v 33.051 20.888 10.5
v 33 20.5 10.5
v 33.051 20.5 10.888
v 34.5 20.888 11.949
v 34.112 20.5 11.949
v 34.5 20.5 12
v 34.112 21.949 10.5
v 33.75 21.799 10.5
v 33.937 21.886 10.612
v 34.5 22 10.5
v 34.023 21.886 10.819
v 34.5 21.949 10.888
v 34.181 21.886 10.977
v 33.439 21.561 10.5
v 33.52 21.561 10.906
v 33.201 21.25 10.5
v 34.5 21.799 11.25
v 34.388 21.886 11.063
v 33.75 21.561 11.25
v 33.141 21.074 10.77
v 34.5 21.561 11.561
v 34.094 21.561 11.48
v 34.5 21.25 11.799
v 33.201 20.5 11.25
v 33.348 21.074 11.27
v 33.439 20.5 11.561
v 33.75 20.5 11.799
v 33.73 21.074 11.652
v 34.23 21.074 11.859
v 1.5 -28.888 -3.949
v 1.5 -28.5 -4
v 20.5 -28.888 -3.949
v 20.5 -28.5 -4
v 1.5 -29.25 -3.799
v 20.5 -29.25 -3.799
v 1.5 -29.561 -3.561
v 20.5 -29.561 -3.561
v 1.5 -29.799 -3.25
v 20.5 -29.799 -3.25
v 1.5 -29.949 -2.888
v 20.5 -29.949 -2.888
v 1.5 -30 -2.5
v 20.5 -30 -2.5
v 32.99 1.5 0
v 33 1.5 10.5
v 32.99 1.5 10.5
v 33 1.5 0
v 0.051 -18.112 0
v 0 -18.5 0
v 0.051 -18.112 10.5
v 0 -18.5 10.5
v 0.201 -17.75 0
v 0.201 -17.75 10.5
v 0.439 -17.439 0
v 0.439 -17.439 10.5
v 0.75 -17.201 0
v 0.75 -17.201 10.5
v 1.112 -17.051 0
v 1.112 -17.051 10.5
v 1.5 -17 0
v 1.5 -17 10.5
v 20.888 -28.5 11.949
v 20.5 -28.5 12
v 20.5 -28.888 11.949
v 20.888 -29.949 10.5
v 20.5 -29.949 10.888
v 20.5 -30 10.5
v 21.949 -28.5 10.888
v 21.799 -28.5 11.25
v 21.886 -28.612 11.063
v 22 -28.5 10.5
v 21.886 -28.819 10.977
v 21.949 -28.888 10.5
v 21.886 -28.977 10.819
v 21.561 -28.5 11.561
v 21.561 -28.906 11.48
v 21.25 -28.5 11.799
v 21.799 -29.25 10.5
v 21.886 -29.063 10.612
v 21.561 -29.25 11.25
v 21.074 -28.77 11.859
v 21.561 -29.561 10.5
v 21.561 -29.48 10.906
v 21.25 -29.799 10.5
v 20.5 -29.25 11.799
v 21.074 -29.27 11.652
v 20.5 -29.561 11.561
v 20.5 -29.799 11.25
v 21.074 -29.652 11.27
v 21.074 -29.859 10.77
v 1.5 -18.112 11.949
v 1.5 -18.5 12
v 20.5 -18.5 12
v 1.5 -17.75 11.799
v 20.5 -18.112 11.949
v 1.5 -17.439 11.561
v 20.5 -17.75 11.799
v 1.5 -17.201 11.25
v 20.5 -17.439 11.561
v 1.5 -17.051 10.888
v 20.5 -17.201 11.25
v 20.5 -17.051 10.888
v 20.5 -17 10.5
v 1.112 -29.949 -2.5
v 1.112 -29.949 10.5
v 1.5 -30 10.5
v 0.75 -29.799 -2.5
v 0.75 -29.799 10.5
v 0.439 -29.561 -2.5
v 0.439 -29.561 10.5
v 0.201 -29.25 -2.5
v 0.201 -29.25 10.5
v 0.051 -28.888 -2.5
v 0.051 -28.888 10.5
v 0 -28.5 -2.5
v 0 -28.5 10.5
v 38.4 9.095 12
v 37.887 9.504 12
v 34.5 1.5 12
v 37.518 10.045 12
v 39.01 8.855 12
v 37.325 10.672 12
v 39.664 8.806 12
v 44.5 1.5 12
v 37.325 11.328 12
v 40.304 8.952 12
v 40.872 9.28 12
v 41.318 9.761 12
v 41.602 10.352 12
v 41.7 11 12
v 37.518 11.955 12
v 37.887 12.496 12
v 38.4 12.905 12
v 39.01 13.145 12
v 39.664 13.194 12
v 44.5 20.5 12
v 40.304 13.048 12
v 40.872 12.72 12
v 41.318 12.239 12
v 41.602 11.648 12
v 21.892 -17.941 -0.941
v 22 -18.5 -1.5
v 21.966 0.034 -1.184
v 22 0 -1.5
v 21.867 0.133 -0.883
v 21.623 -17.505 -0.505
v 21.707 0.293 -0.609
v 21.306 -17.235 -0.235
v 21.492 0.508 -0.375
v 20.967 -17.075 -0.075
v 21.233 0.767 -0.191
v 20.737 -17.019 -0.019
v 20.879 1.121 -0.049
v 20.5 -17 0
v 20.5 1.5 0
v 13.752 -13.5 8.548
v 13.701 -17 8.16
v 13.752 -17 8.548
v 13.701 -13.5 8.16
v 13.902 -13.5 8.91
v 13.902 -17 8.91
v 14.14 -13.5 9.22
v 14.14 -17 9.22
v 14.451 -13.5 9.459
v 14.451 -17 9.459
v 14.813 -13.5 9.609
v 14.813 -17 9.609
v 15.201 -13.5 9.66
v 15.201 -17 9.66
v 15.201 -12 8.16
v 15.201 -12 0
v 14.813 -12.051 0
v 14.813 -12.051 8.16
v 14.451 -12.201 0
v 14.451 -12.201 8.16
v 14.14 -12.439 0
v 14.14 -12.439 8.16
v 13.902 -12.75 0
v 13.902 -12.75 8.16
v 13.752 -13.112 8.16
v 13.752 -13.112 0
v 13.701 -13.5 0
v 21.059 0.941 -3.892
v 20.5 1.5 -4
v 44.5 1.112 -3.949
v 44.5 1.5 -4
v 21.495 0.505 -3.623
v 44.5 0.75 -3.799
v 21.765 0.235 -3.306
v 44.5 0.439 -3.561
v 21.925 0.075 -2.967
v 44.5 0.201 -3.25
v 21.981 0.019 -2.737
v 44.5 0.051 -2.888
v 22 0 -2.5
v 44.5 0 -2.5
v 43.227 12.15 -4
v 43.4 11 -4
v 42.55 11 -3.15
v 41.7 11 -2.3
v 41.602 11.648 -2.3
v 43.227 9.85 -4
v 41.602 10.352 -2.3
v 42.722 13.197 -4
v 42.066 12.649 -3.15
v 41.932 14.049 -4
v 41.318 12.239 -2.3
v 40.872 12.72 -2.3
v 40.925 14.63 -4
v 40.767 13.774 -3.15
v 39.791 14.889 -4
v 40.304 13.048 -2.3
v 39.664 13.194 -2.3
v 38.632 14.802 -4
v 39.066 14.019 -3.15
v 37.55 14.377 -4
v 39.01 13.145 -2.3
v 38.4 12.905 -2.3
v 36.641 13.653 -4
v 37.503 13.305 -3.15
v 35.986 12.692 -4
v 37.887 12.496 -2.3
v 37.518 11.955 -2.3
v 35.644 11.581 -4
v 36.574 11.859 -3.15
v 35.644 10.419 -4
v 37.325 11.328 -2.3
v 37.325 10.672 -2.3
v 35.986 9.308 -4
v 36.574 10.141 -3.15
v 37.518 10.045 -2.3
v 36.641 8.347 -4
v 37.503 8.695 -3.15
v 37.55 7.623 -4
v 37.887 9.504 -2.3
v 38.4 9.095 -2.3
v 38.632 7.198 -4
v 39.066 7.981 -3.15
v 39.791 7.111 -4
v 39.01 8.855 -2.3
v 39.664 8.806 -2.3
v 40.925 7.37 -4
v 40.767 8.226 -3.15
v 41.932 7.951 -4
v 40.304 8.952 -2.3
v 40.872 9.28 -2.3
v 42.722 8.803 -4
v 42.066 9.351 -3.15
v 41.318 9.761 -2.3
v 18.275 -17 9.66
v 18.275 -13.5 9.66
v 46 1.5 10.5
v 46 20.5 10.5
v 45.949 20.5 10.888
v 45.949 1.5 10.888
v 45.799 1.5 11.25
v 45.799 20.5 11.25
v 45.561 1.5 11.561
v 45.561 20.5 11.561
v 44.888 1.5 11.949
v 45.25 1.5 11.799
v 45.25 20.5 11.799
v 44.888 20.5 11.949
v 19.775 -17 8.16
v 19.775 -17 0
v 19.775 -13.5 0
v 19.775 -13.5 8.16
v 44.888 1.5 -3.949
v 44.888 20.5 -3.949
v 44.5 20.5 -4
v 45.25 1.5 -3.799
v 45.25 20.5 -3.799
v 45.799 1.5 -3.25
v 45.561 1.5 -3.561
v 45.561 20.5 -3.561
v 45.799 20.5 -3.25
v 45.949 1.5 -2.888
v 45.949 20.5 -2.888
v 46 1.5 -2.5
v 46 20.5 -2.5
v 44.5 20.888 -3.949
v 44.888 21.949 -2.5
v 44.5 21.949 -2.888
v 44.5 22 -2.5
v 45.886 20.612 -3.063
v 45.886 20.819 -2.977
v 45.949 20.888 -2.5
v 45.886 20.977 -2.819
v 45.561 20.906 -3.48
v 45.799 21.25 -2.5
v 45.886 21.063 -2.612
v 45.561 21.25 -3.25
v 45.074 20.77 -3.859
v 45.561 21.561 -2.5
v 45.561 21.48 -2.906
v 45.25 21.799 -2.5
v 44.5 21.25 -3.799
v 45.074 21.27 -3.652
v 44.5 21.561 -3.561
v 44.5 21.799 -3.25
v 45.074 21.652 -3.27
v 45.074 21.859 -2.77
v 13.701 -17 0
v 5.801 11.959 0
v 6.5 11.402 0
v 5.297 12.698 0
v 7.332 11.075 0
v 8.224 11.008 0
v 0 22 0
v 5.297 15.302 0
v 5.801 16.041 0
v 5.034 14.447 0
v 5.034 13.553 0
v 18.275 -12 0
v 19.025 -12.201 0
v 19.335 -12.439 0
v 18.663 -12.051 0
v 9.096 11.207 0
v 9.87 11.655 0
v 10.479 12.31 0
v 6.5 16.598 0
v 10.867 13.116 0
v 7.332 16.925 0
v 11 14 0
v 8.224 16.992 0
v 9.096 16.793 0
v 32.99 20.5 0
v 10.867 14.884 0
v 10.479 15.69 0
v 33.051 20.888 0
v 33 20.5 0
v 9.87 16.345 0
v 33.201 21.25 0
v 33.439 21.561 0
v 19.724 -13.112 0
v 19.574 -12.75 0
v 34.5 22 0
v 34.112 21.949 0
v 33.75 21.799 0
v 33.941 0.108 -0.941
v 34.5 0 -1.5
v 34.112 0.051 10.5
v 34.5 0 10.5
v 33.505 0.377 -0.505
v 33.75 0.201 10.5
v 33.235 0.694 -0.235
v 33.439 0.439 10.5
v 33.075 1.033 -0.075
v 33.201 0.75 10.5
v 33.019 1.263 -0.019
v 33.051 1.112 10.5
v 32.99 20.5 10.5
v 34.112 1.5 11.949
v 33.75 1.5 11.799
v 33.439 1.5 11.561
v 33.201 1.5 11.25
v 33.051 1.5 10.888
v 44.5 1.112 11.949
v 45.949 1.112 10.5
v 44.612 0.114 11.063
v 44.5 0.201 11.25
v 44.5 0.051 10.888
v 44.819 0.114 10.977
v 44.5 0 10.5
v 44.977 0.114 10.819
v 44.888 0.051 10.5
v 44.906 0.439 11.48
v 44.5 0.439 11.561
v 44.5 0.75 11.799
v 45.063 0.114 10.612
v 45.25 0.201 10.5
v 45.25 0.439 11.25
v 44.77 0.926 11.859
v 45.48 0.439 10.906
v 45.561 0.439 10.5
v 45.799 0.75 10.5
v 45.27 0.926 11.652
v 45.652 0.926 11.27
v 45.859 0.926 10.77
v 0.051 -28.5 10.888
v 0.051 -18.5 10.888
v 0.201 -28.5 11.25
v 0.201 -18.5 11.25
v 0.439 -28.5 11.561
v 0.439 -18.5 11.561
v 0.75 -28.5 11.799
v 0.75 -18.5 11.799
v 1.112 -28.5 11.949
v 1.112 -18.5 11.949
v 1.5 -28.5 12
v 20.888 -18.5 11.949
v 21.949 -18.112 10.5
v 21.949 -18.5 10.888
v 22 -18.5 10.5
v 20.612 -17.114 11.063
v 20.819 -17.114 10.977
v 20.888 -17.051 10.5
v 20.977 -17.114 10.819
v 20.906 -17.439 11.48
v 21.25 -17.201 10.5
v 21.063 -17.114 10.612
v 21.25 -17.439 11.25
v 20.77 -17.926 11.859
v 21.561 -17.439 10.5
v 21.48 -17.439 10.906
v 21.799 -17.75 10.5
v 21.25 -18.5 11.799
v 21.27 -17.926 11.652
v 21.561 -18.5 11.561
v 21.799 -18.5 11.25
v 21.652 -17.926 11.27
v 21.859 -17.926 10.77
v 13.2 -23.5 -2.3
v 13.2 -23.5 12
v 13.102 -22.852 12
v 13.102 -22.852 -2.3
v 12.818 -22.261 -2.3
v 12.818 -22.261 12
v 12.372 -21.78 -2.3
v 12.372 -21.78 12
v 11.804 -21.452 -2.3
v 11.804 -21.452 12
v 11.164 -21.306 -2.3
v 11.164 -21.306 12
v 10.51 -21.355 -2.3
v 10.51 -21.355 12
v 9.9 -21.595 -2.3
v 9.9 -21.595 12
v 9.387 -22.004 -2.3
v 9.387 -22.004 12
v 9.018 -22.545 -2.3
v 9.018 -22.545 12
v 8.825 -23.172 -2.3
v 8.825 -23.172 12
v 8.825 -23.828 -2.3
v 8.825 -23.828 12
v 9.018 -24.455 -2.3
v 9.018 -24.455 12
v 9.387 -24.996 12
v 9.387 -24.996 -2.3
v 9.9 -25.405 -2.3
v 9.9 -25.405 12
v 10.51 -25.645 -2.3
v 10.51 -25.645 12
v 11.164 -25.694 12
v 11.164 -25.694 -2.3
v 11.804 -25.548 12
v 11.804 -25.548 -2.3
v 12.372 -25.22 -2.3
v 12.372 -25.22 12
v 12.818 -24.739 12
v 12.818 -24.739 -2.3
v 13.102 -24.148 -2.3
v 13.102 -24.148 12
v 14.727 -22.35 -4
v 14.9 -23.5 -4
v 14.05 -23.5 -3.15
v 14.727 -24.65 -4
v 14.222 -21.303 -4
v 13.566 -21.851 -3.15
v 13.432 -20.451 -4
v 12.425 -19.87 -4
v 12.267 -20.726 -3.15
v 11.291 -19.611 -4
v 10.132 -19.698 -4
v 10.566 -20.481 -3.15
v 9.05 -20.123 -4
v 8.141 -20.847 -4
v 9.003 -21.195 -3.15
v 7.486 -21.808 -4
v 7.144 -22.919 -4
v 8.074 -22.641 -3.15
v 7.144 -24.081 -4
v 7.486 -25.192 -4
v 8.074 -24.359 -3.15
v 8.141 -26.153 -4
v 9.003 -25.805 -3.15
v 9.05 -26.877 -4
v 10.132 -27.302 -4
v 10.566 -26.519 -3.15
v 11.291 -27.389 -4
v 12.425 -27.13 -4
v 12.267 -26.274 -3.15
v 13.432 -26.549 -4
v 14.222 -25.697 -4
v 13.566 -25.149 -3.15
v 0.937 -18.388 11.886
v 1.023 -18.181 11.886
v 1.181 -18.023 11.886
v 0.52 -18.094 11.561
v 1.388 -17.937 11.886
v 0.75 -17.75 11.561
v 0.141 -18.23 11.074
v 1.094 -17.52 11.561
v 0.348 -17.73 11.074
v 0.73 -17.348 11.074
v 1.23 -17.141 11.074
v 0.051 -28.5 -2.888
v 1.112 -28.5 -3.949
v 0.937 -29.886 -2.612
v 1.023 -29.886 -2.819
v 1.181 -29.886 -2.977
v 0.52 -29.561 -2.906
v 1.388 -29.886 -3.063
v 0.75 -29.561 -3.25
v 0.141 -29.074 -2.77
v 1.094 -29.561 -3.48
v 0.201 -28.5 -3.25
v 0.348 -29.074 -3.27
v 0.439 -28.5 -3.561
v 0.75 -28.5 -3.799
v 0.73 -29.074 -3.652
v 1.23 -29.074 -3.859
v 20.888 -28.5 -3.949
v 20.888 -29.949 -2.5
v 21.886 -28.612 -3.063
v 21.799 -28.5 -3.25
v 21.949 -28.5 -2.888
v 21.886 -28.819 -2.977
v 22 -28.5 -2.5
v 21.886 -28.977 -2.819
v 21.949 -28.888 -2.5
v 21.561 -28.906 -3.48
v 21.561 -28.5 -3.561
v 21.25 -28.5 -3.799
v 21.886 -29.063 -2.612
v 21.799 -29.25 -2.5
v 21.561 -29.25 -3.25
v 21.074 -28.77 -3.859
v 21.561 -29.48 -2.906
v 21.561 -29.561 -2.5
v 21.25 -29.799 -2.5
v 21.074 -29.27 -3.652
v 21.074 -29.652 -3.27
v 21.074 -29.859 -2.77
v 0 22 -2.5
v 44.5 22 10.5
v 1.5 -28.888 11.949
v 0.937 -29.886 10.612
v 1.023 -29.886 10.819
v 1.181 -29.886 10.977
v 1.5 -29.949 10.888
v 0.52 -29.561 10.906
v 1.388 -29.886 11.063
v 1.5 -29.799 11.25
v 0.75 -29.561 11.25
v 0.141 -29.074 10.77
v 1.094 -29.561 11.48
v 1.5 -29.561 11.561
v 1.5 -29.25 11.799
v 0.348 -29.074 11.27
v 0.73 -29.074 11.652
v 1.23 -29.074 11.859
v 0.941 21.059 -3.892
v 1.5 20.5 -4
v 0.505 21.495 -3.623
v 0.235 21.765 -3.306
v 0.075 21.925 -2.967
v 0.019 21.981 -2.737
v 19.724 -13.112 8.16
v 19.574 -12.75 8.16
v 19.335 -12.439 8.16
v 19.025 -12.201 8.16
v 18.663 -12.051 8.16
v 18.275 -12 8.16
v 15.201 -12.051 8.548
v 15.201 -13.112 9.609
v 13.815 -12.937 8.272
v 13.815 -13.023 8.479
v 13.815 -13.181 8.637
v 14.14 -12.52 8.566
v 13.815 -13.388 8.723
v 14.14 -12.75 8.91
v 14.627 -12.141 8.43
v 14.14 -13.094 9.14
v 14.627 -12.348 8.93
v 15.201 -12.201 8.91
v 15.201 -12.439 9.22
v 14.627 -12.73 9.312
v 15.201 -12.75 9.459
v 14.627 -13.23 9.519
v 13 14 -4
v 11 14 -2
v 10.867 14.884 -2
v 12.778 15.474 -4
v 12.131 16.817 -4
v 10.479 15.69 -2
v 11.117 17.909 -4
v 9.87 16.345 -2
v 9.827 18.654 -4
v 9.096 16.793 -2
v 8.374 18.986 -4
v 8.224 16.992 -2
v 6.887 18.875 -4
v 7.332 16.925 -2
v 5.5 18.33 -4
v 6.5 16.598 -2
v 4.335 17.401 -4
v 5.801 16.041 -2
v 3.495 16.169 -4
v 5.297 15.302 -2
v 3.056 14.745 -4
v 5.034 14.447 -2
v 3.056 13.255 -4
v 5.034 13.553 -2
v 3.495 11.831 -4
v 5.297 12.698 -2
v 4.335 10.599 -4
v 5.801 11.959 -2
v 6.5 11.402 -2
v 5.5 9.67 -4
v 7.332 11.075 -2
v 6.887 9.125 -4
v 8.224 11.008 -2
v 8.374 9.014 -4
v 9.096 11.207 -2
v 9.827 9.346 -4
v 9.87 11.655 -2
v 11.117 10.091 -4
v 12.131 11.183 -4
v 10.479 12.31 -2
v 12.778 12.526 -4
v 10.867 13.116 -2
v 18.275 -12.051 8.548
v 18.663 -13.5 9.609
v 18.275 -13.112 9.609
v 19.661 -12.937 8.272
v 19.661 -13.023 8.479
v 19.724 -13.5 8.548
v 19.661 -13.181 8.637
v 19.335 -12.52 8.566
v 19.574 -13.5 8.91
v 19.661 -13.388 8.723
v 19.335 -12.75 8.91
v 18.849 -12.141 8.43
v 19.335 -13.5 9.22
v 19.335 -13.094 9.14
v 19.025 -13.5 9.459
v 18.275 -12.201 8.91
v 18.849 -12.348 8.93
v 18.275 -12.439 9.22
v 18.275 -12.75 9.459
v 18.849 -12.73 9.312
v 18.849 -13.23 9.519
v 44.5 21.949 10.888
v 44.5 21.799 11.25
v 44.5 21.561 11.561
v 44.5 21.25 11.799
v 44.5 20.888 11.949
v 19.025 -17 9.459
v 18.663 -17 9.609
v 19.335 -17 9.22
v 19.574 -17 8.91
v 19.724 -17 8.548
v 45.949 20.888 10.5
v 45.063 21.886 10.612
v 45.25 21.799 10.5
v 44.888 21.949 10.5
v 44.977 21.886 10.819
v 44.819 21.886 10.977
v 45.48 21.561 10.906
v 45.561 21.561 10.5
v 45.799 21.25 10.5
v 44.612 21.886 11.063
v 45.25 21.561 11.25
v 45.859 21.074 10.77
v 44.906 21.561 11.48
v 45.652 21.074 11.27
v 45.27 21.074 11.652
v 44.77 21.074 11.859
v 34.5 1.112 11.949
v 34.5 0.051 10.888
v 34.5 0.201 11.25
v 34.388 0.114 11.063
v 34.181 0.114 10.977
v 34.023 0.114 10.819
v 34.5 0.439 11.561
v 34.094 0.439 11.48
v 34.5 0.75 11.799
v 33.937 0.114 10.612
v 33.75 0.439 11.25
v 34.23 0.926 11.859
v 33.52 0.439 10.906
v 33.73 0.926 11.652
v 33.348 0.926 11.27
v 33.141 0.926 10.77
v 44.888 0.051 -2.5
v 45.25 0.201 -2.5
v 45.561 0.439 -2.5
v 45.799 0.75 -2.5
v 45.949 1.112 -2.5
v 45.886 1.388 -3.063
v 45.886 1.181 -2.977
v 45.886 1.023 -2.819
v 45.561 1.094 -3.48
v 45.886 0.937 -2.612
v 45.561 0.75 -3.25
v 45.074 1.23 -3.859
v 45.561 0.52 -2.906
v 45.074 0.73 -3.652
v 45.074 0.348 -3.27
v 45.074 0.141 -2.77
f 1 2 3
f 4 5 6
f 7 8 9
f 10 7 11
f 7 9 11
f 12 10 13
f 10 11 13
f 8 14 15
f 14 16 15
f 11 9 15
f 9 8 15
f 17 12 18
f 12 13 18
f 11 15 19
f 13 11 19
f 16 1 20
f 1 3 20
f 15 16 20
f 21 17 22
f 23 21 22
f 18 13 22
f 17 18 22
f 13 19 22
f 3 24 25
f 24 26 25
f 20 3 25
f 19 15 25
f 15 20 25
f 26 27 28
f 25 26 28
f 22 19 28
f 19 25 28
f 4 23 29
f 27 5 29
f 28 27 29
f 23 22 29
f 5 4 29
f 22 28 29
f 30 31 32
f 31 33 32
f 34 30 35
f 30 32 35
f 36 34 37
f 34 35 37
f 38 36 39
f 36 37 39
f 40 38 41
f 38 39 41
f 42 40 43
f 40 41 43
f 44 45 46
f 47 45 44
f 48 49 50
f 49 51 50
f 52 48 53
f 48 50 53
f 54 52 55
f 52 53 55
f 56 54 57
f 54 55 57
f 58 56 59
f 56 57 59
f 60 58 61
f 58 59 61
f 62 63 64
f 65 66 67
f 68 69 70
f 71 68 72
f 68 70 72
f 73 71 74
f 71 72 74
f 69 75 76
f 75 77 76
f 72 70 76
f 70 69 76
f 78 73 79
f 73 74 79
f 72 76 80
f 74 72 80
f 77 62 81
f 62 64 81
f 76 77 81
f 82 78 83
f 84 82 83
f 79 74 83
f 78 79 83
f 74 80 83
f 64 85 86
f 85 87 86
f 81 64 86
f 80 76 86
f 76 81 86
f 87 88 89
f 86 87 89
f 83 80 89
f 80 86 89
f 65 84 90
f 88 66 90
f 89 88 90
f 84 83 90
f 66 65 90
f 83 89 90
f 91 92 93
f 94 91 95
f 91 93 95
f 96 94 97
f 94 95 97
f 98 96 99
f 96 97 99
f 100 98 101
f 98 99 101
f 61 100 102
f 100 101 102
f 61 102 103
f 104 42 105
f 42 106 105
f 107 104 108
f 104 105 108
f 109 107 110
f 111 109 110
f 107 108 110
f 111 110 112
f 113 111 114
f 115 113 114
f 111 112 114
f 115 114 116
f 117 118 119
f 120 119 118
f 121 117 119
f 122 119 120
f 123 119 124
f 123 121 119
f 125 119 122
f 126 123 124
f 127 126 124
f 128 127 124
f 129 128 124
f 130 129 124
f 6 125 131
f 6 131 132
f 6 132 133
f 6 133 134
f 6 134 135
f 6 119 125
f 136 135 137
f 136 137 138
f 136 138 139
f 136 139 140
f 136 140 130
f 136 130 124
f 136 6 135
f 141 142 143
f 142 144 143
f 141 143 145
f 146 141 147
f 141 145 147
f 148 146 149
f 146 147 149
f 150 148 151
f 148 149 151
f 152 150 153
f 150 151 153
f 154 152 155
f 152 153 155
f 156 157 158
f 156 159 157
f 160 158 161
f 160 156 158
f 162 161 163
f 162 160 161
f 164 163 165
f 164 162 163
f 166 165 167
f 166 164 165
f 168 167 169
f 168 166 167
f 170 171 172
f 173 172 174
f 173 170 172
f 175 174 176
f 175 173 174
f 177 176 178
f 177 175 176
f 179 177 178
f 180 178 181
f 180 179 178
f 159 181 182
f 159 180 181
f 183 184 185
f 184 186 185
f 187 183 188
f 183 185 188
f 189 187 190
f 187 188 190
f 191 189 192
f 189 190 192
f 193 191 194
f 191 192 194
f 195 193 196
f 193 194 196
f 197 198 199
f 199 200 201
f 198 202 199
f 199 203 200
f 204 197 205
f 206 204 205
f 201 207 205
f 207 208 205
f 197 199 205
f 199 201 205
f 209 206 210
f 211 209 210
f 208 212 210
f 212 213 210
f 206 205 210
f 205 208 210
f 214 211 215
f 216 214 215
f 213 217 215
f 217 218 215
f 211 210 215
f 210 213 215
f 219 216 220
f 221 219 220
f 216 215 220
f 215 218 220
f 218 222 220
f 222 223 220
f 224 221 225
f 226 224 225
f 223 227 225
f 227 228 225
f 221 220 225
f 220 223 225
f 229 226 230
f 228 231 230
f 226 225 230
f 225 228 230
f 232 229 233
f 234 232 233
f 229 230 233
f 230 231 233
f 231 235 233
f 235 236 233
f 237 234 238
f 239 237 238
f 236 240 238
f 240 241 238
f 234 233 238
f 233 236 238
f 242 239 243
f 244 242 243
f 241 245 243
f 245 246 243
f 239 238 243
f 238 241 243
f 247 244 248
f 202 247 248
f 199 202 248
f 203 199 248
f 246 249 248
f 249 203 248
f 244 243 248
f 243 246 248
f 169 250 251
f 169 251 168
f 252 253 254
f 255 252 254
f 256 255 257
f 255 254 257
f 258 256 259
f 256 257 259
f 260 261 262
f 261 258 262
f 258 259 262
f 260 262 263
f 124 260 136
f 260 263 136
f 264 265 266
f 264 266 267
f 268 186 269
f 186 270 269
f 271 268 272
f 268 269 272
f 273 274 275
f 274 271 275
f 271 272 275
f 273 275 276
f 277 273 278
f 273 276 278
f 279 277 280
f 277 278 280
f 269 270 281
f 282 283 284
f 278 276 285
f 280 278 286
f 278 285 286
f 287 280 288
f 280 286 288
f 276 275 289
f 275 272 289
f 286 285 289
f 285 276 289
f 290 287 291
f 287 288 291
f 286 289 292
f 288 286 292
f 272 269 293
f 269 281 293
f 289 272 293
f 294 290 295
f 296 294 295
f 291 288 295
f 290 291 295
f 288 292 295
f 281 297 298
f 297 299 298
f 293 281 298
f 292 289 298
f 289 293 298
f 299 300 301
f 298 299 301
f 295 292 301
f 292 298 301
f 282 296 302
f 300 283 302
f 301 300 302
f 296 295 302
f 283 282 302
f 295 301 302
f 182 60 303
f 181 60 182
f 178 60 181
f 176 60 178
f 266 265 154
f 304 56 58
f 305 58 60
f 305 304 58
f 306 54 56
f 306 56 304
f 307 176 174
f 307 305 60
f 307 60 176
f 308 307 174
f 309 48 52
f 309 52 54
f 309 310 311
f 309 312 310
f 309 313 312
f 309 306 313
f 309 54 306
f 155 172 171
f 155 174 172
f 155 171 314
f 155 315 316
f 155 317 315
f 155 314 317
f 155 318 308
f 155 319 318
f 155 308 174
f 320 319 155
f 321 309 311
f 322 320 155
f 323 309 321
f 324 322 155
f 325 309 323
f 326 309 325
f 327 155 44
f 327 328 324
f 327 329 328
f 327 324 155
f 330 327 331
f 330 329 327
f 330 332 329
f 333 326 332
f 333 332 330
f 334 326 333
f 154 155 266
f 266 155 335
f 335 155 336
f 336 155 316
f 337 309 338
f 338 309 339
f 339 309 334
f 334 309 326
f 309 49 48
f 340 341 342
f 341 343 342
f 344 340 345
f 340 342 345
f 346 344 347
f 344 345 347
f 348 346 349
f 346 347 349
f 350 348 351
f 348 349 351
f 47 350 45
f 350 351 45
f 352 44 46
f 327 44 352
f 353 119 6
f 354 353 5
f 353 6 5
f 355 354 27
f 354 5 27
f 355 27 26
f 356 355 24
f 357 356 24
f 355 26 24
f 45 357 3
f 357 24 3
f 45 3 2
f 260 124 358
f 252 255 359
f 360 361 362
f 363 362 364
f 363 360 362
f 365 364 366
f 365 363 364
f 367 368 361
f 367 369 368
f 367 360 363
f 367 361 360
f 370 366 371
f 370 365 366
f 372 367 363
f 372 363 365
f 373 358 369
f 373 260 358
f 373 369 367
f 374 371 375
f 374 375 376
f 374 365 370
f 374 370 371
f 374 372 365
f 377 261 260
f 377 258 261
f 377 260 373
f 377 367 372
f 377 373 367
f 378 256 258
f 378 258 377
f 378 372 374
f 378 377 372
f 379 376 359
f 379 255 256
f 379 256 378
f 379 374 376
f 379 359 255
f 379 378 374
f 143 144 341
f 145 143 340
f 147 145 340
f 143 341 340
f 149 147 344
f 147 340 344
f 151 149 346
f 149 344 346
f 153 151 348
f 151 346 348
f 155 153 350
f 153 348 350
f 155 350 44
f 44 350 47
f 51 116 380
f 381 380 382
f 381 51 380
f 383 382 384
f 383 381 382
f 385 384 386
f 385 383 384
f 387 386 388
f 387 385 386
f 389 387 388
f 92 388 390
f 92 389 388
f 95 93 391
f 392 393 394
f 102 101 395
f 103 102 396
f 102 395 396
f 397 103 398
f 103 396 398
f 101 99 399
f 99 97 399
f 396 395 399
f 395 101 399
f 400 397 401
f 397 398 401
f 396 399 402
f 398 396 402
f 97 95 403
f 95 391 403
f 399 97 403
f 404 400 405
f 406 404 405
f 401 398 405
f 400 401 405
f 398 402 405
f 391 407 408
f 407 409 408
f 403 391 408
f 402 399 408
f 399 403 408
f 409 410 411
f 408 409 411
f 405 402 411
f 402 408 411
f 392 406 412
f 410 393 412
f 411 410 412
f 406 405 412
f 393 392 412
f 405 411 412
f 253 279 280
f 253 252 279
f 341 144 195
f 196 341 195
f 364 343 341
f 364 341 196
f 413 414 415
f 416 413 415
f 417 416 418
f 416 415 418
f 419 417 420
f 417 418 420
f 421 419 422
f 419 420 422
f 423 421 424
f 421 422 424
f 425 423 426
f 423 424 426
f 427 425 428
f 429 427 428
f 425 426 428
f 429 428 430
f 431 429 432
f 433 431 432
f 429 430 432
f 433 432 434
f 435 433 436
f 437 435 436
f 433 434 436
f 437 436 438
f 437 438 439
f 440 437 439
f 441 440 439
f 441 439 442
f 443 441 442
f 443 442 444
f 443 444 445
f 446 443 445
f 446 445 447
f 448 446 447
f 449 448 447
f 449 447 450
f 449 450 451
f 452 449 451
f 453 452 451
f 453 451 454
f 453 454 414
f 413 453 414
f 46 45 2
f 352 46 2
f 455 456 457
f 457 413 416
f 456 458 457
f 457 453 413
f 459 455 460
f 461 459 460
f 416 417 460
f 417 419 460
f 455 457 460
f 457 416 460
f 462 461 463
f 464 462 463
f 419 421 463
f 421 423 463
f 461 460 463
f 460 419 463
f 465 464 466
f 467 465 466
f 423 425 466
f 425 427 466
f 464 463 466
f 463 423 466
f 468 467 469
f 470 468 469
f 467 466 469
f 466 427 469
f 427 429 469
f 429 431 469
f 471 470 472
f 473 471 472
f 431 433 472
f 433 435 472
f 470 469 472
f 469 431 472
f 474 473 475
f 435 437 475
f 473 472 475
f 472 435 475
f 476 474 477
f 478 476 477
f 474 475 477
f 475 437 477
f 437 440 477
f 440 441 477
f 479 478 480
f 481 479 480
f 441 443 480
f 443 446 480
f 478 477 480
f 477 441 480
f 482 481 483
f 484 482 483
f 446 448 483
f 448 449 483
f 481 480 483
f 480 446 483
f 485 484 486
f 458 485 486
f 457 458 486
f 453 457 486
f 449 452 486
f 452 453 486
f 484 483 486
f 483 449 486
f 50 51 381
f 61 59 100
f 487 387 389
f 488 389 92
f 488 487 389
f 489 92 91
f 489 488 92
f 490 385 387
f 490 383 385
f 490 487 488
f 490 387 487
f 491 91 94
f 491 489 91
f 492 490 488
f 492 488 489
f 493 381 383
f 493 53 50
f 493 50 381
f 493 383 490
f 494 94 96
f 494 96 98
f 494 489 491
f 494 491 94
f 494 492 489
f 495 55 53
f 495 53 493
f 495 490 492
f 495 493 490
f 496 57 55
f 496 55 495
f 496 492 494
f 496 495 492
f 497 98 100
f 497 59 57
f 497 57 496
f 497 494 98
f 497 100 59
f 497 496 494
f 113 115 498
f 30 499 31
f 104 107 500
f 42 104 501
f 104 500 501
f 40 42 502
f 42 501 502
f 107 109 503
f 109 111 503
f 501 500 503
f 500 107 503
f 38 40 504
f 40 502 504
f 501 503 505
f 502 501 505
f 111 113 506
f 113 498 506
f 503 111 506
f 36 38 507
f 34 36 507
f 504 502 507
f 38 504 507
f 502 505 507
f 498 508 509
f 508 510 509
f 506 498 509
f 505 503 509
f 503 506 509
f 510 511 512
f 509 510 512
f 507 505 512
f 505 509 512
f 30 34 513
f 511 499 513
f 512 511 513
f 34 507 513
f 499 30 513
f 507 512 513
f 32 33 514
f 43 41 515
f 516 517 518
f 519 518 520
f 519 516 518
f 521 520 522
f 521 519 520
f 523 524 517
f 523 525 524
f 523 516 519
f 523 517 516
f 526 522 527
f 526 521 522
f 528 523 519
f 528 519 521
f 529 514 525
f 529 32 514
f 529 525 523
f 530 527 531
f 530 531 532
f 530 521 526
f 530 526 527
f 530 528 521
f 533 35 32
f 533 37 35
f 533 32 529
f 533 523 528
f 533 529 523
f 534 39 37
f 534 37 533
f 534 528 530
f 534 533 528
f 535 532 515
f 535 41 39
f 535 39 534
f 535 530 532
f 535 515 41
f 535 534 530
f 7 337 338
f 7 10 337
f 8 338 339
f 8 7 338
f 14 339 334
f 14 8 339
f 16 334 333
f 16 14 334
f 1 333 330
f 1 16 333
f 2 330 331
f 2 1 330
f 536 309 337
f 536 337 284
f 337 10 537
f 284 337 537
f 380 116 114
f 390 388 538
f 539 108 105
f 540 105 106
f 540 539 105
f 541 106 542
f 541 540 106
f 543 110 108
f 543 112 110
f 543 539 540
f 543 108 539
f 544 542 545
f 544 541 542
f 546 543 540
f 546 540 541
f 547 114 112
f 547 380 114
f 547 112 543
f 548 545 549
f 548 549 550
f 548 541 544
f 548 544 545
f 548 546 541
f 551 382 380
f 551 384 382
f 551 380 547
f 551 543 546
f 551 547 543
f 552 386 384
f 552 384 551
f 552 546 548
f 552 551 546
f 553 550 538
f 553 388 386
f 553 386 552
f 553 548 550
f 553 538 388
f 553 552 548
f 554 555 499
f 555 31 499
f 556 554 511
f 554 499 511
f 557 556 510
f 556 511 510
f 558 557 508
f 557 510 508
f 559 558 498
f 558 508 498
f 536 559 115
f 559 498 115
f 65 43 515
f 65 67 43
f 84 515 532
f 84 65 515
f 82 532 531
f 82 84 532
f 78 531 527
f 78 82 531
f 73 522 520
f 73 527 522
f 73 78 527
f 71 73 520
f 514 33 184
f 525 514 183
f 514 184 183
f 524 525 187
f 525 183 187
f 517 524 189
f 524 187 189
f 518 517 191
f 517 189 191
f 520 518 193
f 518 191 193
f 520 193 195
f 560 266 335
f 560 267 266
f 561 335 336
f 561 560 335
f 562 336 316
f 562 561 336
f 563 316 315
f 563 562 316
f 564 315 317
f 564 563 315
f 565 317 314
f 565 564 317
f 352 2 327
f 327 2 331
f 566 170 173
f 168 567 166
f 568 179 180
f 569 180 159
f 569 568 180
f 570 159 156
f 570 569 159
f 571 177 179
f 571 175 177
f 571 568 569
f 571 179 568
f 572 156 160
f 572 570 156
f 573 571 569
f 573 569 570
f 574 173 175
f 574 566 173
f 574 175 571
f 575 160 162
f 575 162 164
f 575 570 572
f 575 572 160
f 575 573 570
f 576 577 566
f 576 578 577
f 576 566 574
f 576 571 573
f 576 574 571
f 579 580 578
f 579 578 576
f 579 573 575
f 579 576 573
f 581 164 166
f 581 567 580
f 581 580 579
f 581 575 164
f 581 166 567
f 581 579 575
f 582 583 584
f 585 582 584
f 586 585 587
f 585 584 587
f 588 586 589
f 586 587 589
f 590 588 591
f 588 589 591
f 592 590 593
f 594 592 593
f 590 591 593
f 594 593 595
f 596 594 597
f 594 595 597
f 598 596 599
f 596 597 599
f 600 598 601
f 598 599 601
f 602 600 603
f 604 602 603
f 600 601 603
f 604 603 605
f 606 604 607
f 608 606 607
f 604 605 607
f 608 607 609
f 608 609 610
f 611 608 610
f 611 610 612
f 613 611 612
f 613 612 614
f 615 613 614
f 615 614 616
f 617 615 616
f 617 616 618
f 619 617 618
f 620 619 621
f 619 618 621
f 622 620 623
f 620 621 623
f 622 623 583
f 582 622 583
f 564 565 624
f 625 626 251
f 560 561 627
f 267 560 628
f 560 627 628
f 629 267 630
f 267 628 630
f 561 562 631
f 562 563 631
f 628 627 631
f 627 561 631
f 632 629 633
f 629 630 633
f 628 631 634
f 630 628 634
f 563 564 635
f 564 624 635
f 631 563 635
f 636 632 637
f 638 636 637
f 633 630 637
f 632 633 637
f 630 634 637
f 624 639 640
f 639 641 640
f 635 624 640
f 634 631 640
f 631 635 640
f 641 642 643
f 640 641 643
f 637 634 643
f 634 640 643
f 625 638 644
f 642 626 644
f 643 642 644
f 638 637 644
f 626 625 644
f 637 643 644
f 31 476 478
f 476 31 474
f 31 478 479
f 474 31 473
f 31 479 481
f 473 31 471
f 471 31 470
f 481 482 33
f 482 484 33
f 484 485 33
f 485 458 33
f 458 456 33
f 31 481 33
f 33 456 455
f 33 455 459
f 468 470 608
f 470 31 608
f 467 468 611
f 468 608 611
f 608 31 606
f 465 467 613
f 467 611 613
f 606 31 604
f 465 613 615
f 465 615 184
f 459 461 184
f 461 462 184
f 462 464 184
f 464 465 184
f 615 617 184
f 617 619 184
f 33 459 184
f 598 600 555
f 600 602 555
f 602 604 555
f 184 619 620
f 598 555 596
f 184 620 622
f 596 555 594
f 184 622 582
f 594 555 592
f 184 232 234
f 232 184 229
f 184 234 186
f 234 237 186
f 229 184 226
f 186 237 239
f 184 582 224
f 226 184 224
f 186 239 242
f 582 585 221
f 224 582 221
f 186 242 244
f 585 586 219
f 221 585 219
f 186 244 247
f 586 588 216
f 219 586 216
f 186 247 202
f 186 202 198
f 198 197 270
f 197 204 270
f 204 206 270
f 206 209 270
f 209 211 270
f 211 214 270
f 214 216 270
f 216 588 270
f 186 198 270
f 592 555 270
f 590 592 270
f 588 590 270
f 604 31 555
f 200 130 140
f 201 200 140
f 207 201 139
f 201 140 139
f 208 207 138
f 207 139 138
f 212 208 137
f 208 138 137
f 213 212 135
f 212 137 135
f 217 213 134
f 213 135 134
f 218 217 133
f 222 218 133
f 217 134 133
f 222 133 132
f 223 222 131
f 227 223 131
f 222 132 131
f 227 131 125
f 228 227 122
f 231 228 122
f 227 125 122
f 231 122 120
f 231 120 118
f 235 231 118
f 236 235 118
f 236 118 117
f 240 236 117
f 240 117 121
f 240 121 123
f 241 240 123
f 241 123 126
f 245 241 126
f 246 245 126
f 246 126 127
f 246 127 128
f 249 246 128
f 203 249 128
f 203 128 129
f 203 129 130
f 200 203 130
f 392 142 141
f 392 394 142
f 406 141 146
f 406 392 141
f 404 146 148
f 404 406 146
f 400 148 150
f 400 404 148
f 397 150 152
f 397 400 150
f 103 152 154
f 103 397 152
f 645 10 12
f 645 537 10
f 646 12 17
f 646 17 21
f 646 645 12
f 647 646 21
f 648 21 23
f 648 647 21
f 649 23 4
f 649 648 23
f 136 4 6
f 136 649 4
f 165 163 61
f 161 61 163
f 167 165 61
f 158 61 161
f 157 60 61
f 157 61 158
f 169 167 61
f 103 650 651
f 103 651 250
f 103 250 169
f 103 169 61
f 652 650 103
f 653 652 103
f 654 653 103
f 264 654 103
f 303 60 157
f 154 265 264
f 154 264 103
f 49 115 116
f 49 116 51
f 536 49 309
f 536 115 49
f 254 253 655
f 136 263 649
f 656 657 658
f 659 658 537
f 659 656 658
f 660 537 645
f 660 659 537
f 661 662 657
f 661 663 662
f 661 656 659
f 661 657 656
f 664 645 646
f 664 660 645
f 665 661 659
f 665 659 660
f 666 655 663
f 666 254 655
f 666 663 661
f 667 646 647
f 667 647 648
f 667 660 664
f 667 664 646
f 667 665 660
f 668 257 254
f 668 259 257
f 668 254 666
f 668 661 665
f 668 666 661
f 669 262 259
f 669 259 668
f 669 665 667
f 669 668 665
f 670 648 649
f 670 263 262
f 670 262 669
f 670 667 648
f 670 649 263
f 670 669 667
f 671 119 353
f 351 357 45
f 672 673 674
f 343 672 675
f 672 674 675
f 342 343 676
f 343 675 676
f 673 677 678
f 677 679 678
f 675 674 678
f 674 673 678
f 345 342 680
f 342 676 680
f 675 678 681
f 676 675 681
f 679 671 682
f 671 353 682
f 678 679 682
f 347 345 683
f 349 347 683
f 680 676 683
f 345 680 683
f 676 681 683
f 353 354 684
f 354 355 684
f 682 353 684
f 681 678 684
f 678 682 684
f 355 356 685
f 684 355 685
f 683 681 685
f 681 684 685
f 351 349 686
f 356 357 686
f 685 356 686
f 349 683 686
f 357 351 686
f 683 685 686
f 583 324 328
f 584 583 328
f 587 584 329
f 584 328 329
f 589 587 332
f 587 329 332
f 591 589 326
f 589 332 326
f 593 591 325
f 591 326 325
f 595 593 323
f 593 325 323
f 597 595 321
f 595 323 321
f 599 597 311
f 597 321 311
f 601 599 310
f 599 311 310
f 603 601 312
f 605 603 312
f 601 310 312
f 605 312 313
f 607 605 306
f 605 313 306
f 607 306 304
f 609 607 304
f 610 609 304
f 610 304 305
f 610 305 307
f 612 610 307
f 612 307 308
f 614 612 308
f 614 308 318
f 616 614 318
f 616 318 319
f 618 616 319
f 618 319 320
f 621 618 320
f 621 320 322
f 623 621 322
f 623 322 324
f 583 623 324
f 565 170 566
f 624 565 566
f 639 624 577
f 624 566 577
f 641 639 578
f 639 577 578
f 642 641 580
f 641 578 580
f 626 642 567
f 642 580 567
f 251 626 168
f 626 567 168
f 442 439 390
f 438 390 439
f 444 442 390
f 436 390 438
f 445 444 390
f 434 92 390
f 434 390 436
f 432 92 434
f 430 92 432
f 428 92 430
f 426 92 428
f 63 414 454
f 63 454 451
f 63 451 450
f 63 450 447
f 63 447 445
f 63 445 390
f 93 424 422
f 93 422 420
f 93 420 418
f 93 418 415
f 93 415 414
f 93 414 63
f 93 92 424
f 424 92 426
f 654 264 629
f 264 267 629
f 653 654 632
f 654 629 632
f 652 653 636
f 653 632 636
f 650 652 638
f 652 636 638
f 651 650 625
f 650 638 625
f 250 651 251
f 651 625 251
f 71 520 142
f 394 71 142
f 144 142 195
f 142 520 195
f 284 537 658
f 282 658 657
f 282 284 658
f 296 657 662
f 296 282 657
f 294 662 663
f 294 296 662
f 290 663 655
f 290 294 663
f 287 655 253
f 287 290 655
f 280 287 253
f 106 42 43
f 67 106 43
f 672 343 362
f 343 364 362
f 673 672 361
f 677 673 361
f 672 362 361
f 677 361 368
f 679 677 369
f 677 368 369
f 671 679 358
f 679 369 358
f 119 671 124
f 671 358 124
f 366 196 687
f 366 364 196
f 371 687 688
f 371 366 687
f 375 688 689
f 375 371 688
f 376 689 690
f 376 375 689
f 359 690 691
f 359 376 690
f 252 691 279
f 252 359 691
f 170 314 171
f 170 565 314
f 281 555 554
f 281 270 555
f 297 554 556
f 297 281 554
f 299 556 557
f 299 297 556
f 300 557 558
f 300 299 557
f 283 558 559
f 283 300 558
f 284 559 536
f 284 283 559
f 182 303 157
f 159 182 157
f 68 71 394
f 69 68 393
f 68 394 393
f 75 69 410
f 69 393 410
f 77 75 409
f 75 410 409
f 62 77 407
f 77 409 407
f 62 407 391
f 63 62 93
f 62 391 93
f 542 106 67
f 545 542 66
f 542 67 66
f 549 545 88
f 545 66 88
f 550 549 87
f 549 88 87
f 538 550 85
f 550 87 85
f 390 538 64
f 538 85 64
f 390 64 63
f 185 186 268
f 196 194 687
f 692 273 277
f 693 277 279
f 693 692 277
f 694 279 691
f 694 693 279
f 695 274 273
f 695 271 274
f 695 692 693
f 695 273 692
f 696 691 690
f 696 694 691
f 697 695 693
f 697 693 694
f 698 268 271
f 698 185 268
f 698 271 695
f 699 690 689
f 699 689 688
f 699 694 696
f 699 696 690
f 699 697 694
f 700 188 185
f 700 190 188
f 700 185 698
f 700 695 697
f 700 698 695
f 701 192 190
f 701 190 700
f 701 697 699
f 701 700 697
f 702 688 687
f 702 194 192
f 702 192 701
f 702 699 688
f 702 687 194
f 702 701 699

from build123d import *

# Parameters (mm, degrees)
RECTANGLE001_W       = 13
RECTANGLE001_H       = 22
PAD_DEPTH            = 12
RECTANGLE_FACE1_W    = 46
RECTANGLE_FACE1_H    = 22
PAD001_DEPTH         = 4
RECTANGLE002_FACE1_W = 22
RECTANGLE002_FACE1_H = 30
PAD002_DEPTH         = 4
RECTANGLE003_FACE1_W = 22
RECTANGLE003_FACE1_H = 13
PAD003_DEPTH         = 12
CIRCLE_R             = 3
POCKET_DEPTH         = 6
CIRCLE001_R          = 2.2
POCKET001_DEPTH      = 5
CIRCLE002_R          = 2.2
POCKET002_DEPTH      = 5
POCKET003_DEPTH      = 22
POCKET004_DEPTH      = 22
CHAMFER_SIZE         = 2
CHAMFER001_SIZE      = 1.7
FILLET_R             = 1.5
FILLET_FACE44_W      = 19
FILLET_FACE44_H      = 10.5
PAD004_DEPTH         = 0.01
SKETCH_W             = 6.073538
SKETCH_H             = 9.65966
PAD005_DEPTH         = 5
FILLET002_R          = 1.5


with BuildPart() as part:
    # Rectangle001 → Pad (new body)
    with BuildSketch(Plane(origin=(33, 0, 0), x_dir=(1, 0, 0), z_dir=(0, 0, 1))):
        with Locations((6.5, 11)):
            Rectangle(RECTANGLE001_W, RECTANGLE001_H)
    extrude(amount=PAD_DEPTH)

    # Rectangle Face1 → Pad001 (add)
    with BuildSketch(Plane.XY):
        with Locations((23, 11)):
            Rectangle(RECTANGLE_FACE1_W, RECTANGLE_FACE1_H)
    extrude(amount=-PAD001_DEPTH)

    # Rectangle002 Face1 → Pad002 (add)
    with BuildSketch(Plane(origin=(0, -30, 0), x_dir=(1, 0, 0), z_dir=(0, 0, 1))):
        with Locations((11, 15)):
            Rectangle(RECTANGLE002_FACE1_W, RECTANGLE002_FACE1_H)
    extrude(amount=-PAD002_DEPTH)

    # Rectangle003 Face1 → Pad003 (add)
    with BuildSketch(Plane(origin=(0, -30, 0), x_dir=(1, 0, 0), z_dir=(0, 0, 1))):
        with Locations((11, 6.5)):
            Rectangle(RECTANGLE003_FACE1_W, RECTANGLE003_FACE1_H)
    extrude(amount=PAD003_DEPTH)

    # Circle → Pocket (cut)
    with BuildSketch(Plane(origin=(8, 14, 0), x_dir=(1, 0, 0), z_dir=(0, 0, 1))):
        Circle(CIRCLE_R)
    extrude(amount=-POCKET_DEPTH, mode=Mode.SUBTRACT)

    # Circle001 → Pocket001 (cut)
    with BuildSketch(Plane(origin=(39.5, 11, 0), x_dir=(1, 0, 0), z_dir=(0, 0, 1))):
        Circle(CIRCLE001_R)
    extrude(amount=-POCKET001_DEPTH, mode=Mode.SUBTRACT)

    # Circle002 → Pocket002 (cut)
    with BuildSketch(Plane(origin=(11, -23.5, 0), x_dir=(1, 0, 0), z_dir=(0, 0, 1))):
        Circle(CIRCLE002_R)
    extrude(amount=-POCKET002_DEPTH, mode=Mode.SUBTRACT)

    # Circle002 → Pocket003 (cut)
    with BuildSketch(Plane(origin=(11, -23.5, 0), x_dir=(1, 0, 0), z_dir=(0, 0, 1))):
        Circle(CIRCLE002_R)
    extrude(amount=POCKET003_DEPTH, mode=Mode.SUBTRACT)

    # Circle001 → Pocket004 (cut)
    with BuildSketch(Plane(origin=(39.5, 11, 0), x_dir=(1, 0, 0), z_dir=(0, 0, 1))):
        Circle(CIRCLE001_R)
    extrude(amount=POCKET004_DEPTH, mode=Mode.SUBTRACT)

    # Chamfer
    chamfer_edges = [part.edges().sort_by_distance(p)[0] for p in [
        (5, 14, -4),
    ]]
    chamfer(chamfer_edges, length=CHAMFER_SIZE)

    # Chamfer001
    chamfer001_edges = [part.edges().sort_by_distance(p)[0] for p in [
        (8.8, -23.5, -4),
        (37.3, 11, -4),
    ]]
    chamfer(chamfer001_edges, length=CHAMFER001_SIZE)

    # Fillet
    fillet_edges = [part.edges().sort_by_distance(p)[0] for p in [
        (23, 22, -4),
        (0, -4, -4),
        (0, -17, 6),
        (0, -23.5, 12),
        (0, -30, 4),
        (11, -30, -4),
        (22, -15, -4),
        (34, 0, -4),
        (46, 11, -4),
        (11, -30, 12),
        (22, -23.5, 12),
        (22, -30, 4),
        (11, -17, 12),
        (22, -17, 6),
        (46, 11, 12),
        (33, 11, 12),
        (39.5, 0, 12),
        (46, 0, 4),
        (46, 22, 4),
        (33, 0, 6),
        (33, 22, 6),
        (39.5, 22, 12),
        (27.5, 0, 0),
        (22, -8.5, 0),
    ]]
    fillet(fillet_edges, radius=FILLET_R)

    # Fillet Face44 → Pad004 (add)
    with BuildSketch(Plane(origin=(33, 11, 5.25), x_dir=(0, 1, 0), z_dir=(-1, 0, 0))):
        Rectangle(FILLET_FACE44_W, FILLET_FACE44_H)
    extrude(amount=PAD004_DEPTH)

    # Sketch → Pad005 (join)
    with BuildSketch(Plane(origin=(33, -17, 0), x_dir=(-1, 0, 0), z_dir=(0, 1, 0))):
        with Locations((16.26208, 4.82983)):
            Rectangle(SKETCH_W, SKETCH_H)
    extrude(amount=PAD005_DEPTH)

    # Fillet002
    fillet002_edges = [part.edges().sort_by_distance(p)[0] for p in [
        (16.73792, -12, 9.65966),
        (19.774689, -12, 4.82983),
        (13.701151, -12, 4.82983),
        (13.701151, -14.5, 9.65966),
        (19.774689, -14.5, 9.65966),
    ]]
    fillet(fillet002_edges, radius=FILLET002_R)


solid = part.part
